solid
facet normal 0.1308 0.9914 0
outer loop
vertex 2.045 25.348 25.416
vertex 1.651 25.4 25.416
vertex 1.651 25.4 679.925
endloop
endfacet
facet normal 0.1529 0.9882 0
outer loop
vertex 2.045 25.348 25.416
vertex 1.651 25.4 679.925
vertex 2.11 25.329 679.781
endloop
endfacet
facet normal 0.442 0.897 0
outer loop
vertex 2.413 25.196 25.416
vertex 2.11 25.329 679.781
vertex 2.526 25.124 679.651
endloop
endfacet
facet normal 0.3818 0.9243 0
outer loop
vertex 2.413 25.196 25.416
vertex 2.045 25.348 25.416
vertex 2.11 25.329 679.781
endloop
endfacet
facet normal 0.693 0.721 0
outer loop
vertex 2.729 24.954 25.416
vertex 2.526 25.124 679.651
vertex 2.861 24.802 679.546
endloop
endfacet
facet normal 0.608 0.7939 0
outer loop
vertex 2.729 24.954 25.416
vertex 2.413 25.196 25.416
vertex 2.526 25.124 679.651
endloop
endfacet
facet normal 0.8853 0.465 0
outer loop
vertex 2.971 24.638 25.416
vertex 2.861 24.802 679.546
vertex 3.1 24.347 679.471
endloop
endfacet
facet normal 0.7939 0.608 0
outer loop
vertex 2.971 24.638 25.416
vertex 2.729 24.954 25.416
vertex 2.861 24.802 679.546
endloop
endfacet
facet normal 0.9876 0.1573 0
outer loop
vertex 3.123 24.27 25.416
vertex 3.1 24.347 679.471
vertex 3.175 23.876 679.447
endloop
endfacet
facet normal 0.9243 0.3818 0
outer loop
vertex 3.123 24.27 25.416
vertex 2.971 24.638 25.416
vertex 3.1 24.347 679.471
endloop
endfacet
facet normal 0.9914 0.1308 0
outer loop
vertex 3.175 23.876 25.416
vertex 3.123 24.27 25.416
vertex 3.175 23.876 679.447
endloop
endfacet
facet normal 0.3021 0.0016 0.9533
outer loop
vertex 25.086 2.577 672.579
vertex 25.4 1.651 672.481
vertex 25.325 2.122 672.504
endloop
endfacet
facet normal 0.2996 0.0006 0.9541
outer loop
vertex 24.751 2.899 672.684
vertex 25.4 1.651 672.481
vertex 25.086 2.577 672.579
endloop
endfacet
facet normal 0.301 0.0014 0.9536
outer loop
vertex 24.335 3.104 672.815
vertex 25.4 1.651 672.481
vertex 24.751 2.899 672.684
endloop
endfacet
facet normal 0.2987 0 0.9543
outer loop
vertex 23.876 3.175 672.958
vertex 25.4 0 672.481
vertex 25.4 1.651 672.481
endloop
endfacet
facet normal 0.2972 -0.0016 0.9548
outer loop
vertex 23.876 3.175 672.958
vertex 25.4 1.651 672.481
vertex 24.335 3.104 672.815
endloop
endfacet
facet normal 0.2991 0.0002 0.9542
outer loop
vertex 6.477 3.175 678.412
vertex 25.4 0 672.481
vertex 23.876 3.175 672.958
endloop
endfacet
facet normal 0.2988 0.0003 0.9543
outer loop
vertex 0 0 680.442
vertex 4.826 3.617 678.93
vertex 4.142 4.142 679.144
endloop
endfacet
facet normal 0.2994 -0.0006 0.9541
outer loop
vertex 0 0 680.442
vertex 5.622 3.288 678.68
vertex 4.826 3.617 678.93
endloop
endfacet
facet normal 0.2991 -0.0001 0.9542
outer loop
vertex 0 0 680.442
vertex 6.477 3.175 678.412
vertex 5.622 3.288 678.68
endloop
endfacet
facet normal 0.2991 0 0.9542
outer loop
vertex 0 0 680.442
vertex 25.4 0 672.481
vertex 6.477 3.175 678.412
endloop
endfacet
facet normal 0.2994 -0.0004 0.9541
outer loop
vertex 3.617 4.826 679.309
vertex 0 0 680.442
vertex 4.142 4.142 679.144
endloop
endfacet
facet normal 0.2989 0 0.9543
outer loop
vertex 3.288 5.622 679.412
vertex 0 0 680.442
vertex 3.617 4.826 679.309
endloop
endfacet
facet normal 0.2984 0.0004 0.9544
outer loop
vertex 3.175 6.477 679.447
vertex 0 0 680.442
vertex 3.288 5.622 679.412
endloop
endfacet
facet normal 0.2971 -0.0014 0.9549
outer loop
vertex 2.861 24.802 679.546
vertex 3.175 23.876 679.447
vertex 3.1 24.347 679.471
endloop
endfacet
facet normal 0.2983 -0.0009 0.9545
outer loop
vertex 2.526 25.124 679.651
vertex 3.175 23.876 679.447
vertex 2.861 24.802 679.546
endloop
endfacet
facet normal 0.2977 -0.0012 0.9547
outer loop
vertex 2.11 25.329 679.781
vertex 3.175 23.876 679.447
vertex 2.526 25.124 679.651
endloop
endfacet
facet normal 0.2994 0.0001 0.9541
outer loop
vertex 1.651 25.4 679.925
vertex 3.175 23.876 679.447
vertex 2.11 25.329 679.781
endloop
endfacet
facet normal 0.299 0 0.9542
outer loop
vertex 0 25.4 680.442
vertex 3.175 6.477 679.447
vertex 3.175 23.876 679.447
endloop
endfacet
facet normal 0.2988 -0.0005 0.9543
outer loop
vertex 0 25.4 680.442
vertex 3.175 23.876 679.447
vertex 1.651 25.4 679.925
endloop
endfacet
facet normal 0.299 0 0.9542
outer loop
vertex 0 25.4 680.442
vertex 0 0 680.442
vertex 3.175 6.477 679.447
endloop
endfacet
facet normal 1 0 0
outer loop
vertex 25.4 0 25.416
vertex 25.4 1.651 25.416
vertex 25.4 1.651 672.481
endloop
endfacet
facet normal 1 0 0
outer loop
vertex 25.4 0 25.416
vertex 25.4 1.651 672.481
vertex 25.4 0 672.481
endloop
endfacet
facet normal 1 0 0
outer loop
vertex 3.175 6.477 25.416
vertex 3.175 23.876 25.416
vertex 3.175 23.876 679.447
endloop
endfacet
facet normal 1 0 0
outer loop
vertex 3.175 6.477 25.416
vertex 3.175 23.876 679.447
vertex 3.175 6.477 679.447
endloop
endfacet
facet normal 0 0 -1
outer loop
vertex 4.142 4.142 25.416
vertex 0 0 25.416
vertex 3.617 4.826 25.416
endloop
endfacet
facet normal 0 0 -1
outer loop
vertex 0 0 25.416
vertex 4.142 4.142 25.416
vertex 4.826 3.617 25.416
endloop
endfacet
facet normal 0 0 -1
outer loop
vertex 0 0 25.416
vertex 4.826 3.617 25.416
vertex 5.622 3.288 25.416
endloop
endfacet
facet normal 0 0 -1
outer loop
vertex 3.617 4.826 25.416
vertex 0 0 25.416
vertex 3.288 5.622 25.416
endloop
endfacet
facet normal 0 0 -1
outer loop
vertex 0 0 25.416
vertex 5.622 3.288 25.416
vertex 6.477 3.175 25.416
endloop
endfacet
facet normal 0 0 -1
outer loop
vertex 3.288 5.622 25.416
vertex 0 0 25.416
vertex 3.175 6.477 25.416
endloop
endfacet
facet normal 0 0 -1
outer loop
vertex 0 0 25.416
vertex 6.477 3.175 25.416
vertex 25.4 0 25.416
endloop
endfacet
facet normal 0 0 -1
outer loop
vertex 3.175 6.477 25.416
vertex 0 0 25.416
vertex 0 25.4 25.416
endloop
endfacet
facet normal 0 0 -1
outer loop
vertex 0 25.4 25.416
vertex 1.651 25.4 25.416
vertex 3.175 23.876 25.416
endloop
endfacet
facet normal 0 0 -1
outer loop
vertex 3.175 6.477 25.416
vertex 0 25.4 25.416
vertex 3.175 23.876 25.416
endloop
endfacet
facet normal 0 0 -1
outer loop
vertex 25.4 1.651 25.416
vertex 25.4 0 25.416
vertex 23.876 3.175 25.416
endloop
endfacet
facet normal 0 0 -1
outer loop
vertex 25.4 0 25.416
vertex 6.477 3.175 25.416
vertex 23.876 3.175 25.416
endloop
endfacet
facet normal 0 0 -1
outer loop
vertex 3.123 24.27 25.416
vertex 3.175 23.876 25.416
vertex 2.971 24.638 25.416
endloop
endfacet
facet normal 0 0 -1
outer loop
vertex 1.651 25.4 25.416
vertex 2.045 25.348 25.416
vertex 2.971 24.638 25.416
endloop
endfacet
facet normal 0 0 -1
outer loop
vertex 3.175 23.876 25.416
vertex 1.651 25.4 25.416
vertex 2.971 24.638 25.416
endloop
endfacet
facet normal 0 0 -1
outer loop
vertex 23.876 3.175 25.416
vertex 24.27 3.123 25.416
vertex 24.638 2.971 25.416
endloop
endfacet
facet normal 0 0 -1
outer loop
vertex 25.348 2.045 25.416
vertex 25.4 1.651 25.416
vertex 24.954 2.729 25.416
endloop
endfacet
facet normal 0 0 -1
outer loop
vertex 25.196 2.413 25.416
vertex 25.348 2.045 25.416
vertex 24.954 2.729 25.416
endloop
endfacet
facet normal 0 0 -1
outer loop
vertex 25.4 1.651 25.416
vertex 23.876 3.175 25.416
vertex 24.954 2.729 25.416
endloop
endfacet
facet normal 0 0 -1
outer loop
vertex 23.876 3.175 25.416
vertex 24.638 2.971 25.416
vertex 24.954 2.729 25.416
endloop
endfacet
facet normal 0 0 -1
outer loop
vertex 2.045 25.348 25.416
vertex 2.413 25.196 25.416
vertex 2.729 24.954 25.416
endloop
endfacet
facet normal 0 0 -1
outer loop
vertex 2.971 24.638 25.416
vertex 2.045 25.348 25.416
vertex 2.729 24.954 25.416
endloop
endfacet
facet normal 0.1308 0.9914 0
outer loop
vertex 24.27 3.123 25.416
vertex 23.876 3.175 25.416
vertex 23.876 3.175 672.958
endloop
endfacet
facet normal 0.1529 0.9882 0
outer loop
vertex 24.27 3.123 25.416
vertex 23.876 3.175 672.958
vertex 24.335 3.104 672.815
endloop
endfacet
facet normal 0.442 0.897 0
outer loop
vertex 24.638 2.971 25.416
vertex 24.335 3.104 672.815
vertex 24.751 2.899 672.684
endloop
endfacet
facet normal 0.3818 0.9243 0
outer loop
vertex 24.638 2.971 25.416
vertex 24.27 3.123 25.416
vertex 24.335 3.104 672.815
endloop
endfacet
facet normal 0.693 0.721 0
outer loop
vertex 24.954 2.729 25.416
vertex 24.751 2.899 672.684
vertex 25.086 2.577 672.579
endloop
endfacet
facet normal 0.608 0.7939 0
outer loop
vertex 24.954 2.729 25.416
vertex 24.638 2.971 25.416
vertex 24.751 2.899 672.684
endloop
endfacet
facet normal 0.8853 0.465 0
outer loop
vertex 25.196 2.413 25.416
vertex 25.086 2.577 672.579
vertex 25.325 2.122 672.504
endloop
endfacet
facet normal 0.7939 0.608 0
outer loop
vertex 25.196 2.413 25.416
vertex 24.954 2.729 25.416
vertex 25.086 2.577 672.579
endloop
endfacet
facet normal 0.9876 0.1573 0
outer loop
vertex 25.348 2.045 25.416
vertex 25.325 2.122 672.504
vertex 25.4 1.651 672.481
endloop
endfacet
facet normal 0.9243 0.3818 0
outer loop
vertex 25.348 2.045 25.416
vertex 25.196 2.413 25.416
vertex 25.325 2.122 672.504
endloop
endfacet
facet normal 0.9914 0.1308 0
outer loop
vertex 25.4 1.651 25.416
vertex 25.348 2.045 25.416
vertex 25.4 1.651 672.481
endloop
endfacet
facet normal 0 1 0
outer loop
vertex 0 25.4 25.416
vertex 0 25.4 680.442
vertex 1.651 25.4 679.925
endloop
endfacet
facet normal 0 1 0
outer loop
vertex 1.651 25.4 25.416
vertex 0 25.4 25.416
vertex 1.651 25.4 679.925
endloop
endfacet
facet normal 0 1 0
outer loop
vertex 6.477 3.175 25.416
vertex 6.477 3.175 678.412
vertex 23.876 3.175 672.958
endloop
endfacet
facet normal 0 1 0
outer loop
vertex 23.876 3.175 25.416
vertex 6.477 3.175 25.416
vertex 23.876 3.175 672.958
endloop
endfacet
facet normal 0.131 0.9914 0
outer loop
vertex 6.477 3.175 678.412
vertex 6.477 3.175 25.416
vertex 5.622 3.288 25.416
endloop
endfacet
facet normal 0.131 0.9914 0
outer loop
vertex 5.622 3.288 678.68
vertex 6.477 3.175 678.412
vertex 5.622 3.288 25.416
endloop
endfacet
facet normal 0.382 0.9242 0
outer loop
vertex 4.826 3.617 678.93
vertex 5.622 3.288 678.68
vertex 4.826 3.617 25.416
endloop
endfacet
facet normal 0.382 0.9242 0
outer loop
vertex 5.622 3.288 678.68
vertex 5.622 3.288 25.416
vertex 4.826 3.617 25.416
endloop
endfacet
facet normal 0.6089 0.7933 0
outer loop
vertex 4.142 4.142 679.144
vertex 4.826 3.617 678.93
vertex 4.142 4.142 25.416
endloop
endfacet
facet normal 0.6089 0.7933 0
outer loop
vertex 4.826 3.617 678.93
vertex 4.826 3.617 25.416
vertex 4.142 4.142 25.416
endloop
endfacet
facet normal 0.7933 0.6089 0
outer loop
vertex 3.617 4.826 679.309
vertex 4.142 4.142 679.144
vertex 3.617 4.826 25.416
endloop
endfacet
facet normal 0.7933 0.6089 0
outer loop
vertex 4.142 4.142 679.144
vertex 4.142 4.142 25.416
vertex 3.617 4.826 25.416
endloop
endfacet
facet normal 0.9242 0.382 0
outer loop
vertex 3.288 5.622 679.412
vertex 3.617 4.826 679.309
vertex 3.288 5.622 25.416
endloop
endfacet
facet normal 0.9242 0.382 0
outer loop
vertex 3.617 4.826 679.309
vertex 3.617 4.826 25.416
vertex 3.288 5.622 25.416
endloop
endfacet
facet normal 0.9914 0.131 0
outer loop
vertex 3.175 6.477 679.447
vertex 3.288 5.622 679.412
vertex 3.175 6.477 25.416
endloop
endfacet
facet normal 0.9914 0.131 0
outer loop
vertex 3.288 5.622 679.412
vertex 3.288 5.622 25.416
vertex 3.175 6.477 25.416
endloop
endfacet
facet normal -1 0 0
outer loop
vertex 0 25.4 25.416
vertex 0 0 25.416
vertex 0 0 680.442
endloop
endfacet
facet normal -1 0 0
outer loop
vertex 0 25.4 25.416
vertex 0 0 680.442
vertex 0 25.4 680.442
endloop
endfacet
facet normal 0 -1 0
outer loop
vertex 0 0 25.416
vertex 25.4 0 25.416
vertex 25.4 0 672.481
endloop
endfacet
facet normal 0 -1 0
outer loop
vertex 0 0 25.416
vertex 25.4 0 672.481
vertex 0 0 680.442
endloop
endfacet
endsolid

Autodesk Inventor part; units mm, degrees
ref_plane "Start Plane" through (0, 0, 25.4165) normal (0, 0, 1) x (1, 0, 0)
ref_plane "End Plane" through (0, 0, 680.4425) normal (0, 0, 1) x (1, 0, 0)
sketch "Sketch" plane through (0, 0, 0) normal (0, 0, 1) x (1, 0, 0)
  line L0 (25.4, 0) -> (0, 0)
  line L1 (0, 0) -> (0, 25.4)
  line L2 (0, 25.4) -> (1.651, 25.4)
  line L3 (3.175, 23.876) -> (3.175, 6.477)
  line L4 (6.477, 3.175) -> (23.876, 3.175)
  line L5 (25.4, 1.651) -> (25.4, 0)
  line L6 (0, -11.0414) -> (0, 31.5385) construction
  line L7 (-11.0414, 0) -> (31.5385, 0) construction
  arc A0 (3.175, 6.477) -> (6.477, 3.175) centre (6.477, 6.477) ccw
  arc A1 (3.175, 23.876) -> (1.651, 25.4) centre (1.651, 23.876) ccw
  arc A2 (25.4, 1.651) -> (23.876, 3.175) centre (23.876, 1.651) ccw
  line L8 (0, 40.0545) -> (0, -19.5574) construction
  line L9 (-19.5574, 0) -> (40.0545, 0) construction
  point P0 (3.175, 25.4)
  point P1 (3.175, 3.175)
  point P2 (25.4, 3.175)
  dimension "d0" = 25.4
  dimension "d1" = 25.4
  dimension "d2" = 3.175
  dimension "d3" = 3.175
  dimension "d10" = 0
  dimension "d11" = 0
  dimension "d14" = 3.302
  dimension "d15" = 1.524
extrude "Body" add sketch "Sketch" along normal up to surface (655.026 mm away) from surface at 25.4165
sketch "Sketch3" plane through (0, 0, 0) normal (0, 0, 1) x (1, 0, 0)
  line L0 (0, 0) -> (10, 0)
ref_plane "Work Plane3" through (0, 0, 0) normal (0, -1, 0) x (1, 0, 0)
ref_plane "Work Plane4" through (0, 12.7, 680.4425) normal (0.2991, 0, 0.9542) x (0.9542, 0, -0.2991)
split "Split1" plane through (0, 12.7, 680.4425) removes the side toward (0.2991, 0, 0.9542)
ref_plane "Work Plane5" through (-0.8564, 664.6, 23.7336) normal (0, 1, 0) x (1, 0, 0)
split "Split2" plane through (-0.8564, 664.6, 23.7336) removes the side toward (0, 1, 0)
sketch "Sketch4" plane through (0, 0, 0) normal (0, -1, 0) x (1, 0, 0)
  line L0 (-2, 25.4165) -> (12, 25.4165) projected
  line L1 (-2, 680.4425) -> (12, 680.4425) projected
  dimension "d17" = 655.026
equation "\"d0\" = G_H"
equation "\"d1\" = G_H"
equation "\"d2\" = G_T"
equation "\"d3\" = G_T"
equation "\"d14\" = G_IR"
equation "\"d15\" = G_ER"
equation "\"d4\" = G_L"
equation "\"G_H\" = 25.4"
equation "\"G_T\" = 3.175"
equation "\"G_ER\" = 1.524"
equation "\"G_IR\" = 3.302"
equation "\"G_L\" = d17"
equation "\"ex\" = 0"
equation "\"G_OFFSET_START\" = -25.41653"
equation "\"G_OFFSET_END\" = 0"
equation "\"d12\" = -G_OFFSET_START"
equation "\"d13\" = G_OFFSET_END + B_L"
equation "\"B_L\" = 680.44252"
properties part number "AISC - L 1 x 1 x 1/8 - 25.788" material "Steel, Mild"
